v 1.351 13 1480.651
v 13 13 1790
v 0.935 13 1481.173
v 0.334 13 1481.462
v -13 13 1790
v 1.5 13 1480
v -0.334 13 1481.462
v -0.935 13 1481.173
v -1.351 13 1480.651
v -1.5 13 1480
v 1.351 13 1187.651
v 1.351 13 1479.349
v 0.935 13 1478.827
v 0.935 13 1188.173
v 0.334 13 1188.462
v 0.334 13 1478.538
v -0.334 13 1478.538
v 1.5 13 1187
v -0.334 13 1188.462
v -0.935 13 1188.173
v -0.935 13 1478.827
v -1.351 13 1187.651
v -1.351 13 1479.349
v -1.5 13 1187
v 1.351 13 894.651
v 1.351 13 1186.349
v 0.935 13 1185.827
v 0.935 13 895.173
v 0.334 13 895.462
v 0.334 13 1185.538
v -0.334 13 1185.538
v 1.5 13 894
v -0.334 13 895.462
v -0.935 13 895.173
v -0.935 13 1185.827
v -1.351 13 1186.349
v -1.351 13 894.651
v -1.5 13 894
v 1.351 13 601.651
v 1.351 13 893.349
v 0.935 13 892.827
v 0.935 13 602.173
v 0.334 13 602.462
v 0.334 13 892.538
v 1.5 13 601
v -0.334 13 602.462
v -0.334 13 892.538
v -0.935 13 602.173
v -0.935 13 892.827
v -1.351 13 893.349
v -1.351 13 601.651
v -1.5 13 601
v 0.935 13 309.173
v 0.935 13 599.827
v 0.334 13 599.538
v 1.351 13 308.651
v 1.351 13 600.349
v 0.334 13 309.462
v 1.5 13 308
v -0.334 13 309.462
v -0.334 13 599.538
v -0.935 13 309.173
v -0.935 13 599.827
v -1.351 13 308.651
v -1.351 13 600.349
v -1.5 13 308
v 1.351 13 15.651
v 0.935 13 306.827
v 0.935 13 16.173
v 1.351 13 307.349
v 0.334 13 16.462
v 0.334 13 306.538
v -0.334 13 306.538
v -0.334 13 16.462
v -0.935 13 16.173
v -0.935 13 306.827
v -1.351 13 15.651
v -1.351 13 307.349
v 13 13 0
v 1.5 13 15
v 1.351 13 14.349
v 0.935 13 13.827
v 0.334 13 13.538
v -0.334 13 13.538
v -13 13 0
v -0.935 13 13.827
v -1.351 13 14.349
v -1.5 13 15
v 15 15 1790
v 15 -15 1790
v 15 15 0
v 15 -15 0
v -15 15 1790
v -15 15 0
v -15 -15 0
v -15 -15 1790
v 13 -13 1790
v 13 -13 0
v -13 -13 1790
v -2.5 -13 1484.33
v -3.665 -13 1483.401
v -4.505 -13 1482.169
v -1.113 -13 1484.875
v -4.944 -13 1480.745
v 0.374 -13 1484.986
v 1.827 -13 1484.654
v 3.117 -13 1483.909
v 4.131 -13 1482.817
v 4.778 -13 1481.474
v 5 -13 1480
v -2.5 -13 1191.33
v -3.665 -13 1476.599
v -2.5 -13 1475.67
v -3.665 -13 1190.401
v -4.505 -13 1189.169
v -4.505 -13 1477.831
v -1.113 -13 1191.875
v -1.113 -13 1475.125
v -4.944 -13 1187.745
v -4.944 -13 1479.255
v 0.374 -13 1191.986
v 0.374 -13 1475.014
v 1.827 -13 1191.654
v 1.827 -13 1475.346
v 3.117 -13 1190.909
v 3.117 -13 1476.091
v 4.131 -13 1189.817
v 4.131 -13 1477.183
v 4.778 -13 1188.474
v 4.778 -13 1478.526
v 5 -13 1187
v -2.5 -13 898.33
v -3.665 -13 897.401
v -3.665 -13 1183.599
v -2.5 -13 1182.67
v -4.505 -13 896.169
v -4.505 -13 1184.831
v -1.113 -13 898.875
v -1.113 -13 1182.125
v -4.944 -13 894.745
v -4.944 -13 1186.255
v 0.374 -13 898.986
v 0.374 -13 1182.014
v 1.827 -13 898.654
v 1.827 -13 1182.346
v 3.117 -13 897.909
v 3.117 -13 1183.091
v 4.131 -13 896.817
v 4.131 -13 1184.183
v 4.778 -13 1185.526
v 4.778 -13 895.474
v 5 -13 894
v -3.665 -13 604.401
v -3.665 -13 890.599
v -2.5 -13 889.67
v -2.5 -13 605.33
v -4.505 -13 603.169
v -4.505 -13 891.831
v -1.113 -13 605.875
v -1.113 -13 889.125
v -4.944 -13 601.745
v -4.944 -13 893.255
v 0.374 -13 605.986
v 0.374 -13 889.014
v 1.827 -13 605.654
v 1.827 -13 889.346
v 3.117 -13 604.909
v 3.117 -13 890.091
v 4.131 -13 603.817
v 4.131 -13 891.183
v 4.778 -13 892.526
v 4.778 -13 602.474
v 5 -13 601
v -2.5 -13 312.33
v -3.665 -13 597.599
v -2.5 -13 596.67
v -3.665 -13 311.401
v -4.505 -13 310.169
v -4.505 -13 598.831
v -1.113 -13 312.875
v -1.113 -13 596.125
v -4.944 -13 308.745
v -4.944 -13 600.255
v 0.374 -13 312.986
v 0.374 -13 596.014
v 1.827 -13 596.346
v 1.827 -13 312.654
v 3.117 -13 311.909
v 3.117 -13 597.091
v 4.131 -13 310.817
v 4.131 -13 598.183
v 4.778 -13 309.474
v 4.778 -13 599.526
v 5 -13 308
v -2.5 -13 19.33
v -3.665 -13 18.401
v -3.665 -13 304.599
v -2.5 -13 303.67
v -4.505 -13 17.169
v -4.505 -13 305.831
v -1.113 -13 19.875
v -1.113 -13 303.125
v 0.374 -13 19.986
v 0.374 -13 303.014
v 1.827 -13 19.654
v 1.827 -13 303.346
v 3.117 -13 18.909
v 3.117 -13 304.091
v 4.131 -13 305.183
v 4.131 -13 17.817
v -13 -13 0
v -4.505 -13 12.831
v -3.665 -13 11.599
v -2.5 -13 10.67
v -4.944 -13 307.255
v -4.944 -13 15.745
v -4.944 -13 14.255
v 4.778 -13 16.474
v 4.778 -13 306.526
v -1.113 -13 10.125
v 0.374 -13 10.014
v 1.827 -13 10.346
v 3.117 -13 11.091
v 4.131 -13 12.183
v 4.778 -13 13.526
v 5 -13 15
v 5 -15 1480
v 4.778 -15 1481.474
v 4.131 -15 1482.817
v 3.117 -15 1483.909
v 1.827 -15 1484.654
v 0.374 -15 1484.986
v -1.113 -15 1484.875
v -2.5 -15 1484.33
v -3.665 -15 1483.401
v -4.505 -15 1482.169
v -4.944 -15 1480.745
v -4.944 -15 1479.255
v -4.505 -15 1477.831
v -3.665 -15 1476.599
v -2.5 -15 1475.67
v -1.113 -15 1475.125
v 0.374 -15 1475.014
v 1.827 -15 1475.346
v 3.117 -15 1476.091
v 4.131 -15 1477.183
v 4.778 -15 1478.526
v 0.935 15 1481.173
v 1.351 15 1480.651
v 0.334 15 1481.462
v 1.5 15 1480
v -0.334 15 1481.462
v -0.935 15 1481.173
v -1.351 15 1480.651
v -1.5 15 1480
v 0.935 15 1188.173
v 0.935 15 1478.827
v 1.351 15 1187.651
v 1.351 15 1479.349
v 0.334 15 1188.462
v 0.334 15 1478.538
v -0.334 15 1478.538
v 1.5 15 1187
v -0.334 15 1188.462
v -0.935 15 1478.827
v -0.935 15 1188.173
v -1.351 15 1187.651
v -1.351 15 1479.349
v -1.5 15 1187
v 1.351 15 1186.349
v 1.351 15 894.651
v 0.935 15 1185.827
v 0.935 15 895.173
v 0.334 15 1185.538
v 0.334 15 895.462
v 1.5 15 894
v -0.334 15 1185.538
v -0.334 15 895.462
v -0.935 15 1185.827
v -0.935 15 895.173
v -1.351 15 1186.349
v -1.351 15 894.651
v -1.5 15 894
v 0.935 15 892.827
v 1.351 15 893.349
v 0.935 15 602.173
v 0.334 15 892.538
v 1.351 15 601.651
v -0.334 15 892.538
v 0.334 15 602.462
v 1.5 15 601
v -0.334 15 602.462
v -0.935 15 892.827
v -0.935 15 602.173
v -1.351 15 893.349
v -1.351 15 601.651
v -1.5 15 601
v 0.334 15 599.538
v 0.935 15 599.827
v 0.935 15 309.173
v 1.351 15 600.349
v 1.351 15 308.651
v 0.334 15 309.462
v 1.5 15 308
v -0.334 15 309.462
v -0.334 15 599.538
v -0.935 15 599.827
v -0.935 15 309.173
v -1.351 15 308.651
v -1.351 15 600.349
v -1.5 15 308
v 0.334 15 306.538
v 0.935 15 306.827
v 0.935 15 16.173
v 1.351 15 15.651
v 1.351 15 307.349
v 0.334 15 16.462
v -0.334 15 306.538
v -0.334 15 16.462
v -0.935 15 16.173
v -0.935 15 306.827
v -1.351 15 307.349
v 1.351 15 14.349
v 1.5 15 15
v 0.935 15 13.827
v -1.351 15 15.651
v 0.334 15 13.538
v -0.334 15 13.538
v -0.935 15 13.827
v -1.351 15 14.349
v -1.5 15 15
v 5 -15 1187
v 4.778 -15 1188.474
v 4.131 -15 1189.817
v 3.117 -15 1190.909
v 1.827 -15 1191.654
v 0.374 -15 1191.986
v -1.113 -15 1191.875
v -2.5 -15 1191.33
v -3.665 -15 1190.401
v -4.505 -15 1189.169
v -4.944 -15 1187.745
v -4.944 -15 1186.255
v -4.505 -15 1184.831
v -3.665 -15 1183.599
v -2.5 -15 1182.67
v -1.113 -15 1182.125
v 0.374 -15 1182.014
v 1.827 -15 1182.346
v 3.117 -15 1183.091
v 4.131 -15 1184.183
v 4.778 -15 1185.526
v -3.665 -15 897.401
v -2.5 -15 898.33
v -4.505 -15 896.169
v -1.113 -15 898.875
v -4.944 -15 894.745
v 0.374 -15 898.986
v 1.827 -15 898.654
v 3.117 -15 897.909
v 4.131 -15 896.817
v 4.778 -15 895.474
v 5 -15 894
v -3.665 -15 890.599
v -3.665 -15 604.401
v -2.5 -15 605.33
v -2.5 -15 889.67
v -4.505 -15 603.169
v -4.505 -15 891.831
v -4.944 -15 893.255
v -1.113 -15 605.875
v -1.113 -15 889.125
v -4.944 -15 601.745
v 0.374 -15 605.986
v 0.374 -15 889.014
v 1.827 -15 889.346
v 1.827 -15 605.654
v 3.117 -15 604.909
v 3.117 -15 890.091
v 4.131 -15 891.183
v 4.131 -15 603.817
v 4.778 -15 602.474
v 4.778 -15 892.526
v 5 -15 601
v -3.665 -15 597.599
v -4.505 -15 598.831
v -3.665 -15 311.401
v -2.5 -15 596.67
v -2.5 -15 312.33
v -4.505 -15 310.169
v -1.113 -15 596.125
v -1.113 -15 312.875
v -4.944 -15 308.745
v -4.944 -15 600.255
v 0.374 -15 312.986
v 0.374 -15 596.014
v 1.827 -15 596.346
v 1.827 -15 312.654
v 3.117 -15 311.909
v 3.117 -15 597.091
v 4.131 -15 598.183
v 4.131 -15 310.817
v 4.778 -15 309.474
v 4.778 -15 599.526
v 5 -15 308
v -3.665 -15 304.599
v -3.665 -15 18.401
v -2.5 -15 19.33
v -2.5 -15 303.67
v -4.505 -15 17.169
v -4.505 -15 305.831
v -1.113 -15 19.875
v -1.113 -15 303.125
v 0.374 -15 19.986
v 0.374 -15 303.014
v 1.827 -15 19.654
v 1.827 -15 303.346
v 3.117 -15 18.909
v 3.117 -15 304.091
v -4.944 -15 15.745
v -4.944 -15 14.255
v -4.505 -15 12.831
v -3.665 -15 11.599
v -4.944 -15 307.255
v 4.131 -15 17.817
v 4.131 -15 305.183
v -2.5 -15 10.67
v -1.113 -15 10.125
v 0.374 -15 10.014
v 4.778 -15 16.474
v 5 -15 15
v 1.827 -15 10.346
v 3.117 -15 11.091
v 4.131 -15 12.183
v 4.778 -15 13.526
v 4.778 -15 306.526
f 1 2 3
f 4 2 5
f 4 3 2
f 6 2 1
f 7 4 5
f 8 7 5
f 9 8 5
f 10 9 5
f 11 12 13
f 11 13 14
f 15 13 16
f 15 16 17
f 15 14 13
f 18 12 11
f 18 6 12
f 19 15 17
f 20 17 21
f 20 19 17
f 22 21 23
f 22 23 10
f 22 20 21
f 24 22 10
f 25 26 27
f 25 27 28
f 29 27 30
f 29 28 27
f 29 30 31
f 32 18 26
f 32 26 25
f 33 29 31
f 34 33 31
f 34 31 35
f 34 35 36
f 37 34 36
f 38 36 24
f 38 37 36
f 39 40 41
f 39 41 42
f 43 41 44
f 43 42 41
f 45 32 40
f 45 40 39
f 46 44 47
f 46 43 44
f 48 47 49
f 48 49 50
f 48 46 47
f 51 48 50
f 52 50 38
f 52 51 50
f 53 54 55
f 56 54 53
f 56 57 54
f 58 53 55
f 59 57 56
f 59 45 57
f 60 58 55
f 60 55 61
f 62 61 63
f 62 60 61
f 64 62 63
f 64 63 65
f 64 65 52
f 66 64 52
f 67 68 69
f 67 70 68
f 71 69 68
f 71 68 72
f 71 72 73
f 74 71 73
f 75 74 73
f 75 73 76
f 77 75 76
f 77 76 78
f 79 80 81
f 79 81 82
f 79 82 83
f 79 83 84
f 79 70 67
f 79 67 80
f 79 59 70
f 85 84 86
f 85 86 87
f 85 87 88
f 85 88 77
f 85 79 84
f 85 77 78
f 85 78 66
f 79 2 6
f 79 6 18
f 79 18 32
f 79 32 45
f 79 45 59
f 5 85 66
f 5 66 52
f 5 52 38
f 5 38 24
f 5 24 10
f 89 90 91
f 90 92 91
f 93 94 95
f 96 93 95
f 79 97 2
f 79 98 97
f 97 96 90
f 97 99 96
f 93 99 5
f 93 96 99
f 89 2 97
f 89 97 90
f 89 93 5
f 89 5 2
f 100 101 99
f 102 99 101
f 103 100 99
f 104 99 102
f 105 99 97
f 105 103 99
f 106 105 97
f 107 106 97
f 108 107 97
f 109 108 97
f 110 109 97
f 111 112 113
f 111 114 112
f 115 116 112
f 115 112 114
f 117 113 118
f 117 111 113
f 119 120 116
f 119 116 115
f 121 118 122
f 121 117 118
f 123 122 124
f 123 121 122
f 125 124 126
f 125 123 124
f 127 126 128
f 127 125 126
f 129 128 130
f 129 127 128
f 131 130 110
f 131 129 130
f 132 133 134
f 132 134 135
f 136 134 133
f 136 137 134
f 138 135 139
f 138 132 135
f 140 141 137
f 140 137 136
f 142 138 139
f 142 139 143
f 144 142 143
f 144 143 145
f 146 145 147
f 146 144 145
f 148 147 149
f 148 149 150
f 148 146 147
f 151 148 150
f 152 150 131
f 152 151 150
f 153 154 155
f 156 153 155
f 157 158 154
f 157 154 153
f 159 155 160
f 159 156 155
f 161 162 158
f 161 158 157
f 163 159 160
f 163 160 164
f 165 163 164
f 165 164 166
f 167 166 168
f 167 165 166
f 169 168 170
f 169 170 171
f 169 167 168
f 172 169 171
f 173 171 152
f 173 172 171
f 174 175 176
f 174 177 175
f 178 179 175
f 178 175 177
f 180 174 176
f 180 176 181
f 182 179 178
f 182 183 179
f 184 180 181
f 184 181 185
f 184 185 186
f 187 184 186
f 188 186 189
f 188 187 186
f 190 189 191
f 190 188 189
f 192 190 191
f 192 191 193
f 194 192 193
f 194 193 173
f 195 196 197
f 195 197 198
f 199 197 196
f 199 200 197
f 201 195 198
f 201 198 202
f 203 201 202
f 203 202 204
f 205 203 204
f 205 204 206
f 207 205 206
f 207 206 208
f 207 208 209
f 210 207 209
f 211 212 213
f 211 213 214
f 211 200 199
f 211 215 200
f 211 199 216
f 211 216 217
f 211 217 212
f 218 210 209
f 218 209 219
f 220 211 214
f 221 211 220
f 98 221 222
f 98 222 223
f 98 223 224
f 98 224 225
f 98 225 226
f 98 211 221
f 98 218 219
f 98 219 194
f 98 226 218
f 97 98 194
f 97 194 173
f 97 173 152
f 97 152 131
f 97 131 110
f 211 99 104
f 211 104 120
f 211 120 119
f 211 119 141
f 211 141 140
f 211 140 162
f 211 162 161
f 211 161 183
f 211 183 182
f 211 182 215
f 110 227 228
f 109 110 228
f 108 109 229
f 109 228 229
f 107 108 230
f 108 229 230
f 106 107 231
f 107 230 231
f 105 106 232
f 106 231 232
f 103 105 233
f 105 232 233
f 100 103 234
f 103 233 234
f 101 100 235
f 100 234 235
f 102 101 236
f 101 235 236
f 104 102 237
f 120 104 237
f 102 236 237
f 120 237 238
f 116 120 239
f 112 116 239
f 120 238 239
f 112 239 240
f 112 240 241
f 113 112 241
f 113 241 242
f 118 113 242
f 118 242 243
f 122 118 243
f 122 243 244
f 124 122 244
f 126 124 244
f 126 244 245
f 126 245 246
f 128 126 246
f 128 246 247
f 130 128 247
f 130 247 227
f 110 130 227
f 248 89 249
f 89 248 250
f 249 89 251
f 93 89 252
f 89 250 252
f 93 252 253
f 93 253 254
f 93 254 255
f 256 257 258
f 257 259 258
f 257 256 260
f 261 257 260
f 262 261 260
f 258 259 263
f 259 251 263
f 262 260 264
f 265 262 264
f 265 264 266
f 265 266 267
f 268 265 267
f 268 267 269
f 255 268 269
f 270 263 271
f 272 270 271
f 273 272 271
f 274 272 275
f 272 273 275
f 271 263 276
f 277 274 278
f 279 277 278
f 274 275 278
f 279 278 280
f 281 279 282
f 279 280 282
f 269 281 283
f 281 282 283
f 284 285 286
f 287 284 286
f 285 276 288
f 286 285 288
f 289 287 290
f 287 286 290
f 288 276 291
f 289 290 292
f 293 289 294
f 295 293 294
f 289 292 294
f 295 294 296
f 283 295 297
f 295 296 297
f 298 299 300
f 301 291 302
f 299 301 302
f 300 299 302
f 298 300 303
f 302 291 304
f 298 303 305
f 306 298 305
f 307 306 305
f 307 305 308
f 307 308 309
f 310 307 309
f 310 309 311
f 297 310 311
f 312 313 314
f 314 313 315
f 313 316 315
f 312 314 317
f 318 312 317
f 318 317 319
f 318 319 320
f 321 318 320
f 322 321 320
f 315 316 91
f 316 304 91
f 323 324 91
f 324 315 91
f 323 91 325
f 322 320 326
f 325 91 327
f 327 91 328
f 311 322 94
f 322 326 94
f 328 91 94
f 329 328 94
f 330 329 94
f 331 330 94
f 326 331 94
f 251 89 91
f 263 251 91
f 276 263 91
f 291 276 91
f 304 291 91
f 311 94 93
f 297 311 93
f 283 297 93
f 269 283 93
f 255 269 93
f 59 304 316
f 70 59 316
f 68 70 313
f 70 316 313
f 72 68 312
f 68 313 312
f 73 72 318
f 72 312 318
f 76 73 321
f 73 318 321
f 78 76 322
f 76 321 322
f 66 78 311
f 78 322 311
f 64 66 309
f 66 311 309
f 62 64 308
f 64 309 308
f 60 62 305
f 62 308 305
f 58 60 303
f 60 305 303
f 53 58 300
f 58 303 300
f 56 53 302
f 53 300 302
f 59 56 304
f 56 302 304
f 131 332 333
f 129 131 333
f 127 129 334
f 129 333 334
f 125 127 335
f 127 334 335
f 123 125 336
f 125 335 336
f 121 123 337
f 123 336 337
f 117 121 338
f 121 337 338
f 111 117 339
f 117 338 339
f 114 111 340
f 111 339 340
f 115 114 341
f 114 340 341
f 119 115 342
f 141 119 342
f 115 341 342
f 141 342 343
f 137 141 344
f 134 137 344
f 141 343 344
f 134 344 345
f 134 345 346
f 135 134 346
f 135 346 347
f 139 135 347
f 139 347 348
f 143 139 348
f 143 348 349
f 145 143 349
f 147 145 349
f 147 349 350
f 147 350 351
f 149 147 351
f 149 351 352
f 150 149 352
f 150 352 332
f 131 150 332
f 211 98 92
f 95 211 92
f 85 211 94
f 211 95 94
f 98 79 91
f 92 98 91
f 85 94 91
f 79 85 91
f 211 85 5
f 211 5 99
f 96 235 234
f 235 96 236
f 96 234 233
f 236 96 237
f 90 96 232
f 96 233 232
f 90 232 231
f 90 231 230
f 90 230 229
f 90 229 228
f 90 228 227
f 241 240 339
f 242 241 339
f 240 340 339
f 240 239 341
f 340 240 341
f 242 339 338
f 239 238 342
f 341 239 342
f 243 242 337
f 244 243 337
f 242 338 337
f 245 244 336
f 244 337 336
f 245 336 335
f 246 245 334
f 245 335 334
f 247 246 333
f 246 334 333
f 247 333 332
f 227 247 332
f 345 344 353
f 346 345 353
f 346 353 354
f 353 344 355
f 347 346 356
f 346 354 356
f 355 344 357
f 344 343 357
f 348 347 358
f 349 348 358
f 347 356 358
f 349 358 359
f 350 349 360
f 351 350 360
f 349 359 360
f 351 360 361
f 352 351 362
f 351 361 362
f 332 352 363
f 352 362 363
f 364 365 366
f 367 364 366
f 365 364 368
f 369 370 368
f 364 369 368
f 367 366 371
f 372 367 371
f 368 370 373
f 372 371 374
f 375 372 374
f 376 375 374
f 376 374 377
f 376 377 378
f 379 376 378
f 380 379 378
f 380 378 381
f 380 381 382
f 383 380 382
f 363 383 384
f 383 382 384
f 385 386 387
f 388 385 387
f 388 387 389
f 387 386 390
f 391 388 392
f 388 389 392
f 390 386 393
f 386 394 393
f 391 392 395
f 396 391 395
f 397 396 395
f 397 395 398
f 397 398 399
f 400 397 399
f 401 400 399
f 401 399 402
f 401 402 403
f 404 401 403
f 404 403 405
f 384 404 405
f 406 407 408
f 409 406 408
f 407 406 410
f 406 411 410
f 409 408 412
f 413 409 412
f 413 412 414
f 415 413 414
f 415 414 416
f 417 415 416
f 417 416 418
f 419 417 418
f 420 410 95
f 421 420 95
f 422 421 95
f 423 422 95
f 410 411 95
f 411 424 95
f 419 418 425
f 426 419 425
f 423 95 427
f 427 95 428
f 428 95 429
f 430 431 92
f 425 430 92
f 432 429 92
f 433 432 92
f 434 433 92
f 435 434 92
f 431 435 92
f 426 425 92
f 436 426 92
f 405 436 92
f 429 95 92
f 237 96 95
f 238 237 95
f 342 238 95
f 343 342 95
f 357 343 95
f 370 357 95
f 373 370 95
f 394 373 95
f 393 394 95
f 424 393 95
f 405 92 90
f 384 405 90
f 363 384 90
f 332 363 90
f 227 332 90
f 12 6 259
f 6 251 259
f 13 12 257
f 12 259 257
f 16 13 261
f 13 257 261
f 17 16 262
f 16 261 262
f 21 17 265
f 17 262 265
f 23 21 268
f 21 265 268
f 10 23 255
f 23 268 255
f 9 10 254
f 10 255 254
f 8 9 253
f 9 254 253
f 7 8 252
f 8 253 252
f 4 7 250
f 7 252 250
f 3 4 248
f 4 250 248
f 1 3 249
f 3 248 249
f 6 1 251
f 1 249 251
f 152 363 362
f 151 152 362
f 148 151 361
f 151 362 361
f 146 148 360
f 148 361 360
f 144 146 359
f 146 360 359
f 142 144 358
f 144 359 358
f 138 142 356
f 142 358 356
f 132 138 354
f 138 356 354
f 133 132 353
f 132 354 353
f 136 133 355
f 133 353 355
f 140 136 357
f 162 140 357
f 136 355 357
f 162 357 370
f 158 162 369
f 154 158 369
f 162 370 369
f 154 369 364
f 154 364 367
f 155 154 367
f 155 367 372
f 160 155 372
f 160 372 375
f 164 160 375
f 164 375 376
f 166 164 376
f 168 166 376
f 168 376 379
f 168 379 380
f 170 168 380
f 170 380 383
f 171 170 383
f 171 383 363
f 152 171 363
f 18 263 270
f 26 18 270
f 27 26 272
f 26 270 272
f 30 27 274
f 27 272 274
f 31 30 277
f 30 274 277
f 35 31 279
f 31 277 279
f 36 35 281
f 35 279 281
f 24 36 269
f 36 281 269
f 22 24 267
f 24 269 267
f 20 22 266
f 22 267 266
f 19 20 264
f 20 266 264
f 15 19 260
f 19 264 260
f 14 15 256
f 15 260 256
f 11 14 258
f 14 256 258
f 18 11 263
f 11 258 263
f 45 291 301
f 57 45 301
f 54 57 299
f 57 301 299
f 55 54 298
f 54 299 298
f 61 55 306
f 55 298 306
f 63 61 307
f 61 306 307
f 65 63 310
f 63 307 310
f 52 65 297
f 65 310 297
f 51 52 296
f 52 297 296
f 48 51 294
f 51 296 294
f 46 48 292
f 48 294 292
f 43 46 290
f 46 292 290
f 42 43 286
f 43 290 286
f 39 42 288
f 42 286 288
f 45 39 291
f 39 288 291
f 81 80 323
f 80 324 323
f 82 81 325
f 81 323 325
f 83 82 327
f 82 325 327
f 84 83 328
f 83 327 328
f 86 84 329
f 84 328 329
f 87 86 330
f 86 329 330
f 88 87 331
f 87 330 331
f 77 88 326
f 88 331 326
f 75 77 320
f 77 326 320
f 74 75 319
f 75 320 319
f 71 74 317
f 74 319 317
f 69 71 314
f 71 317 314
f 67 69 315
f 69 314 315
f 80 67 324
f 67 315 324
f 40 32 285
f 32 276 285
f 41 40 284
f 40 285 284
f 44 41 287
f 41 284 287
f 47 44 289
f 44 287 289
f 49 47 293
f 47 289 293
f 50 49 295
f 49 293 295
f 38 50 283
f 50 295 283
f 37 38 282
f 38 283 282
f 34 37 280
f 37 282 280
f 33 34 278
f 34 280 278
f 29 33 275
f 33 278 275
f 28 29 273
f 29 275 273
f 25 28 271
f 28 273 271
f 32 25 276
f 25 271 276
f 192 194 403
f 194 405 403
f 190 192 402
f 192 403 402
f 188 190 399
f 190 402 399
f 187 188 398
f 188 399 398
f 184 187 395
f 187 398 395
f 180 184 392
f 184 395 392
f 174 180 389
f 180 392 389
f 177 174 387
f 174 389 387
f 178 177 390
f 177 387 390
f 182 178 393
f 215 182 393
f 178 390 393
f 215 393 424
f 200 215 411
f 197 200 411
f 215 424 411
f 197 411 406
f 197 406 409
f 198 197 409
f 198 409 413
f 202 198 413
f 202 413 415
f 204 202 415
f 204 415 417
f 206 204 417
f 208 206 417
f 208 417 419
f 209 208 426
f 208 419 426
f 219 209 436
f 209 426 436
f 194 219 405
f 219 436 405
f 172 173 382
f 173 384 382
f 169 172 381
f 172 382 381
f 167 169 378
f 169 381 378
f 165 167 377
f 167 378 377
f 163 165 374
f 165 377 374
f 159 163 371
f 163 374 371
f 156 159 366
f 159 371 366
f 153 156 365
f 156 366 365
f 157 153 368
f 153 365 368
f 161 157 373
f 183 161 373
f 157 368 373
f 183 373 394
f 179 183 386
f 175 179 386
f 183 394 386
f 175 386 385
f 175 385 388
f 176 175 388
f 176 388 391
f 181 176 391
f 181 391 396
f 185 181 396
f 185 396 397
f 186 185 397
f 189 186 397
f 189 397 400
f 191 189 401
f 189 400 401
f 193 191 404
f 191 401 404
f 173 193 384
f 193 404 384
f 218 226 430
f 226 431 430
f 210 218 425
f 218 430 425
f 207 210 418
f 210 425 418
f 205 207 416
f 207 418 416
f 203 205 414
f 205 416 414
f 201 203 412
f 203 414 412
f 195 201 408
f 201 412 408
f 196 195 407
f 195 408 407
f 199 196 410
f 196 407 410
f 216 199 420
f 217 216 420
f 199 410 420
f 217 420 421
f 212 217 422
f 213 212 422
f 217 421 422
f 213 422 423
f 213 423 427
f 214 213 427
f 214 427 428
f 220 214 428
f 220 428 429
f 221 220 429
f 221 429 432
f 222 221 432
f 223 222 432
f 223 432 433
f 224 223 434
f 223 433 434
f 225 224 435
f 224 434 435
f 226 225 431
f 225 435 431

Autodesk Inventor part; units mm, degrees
ref_plane "YZ Plane" through (0, 0, 0) normal (1, 0, 0) x (0, 1, 0)
ref_plane "XZ Plane" through (0, 0, 0) normal (0, 1, 0) x (-1, 0, 0)
ref_plane "XY Plane" through (0, 0, 0) normal (0, 0, 1) x (1, 0, 0)
sketch "Náčrt1" plane through (0, 0, 0) normal (0, 0, 1) x (1, 0, 0)
  line L0 (-15, -15) -> (15, -15)
  line L1 (15, -15) -> (15, 15)
  line L2 (15, 15) -> (-15, 15)
  line L3 (-15, 15) -> (-15, -15)
  line L4 (-15, -15) -> (15, 15) construction
  line L5 (15, -15) -> (-15, 15) construction
  line L6 (-13, -13) -> (13, -13)
  line L7 (13, -13) -> (13, 13)
  line L8 (13, 13) -> (-13, 13)
  line L9 (-13, 13) -> (-13, -13)
  line L10 (-13, -13) -> (13, 13) construction
  line L11 (13, -13) -> (-13, 13) construction
  point P0 (0, 0)
  dimension "d0" = 30
  dimension "d1" = 30
  dimension "d2" = 26
  dimension "d3" = 26
extrude "Vysunutí1" add sketch "Náčrt1" along normal blind 1790
sketch "Náčrt2" plane through (-15, 15, 0) normal (0, 1, 0) x (1, 0, 0)
  circle A0 centre (15, -15) radius 1.5
  line L0 (30, 0) -> (0, 0) projected
  line L1 (0, 0) -> (0, -1790) projected
  line L2 (30, -1790) -> (0, -1790) projected
  line L3 (30, 0) -> (30, -1790) projected
  point P0 (15, 0)
  dimension "d8" = 3
  dimension "d13" = 15
  dimension "d19" = 15
extrude "Vysunutí2" cut sketch "Náčrt2" against normal up to surface (2 mm away) contours A0
sketch "Náčrt3" plane through (-15, -15, 0) normal (0, -1, 0) x (1, 0, 0)
  line L0 (30, 0) -> (0, 0) projected
  line L1 (0, 0) -> (0, 1790) projected
  line L2 (30, 1790) -> (0, 1790) projected
  line L3 (30, 0) -> (30, 1790) projected
  circle A0 centre (15, 15) radius 1.5 projected
  circle A1 centre (15, 15) radius 5
  point P0 (15, 0)
  dimension "d15" = 10
extrude "Vysunutí3" cut sketch "Náčrt3" against normal up to surface (2 mm away) contours A0 | A1
pattern_linear "Obdélníkové pole1" count 6 spacing 293 along (0, 0, 1) of "Vysunutí2"
pattern_linear "Obdélníkové pole3" count 6 spacing 293 along (0, 0, 1) of "Vysunutí3"
equation "\"d0\" = width"
equation "\"d1\" = width"
equation "\"d2\" = width - 2 * thickness"
equation "\"d3\" = width - 2 * thickness"
equation "\"d4\" = length"
equation "\"d8\" = holeDia"
equation "\"d13\" = holeOffset"
equation "\"d19\" = 0.5 * width"
equation "\"d15\" = holeDiaOpposite"
equation "\"d22\" = holeDistance"
equation "\"d28\" = holeDistance"
equation "\"width\" = gSquareProfile_Width_Rack"
equation "\"thickness\" = gSquareProfile_Thickness_Rack"
equation "\"length\" = gRack_Rom_Height - 2 * width"
equation "\"holeDistance\" = 293"
equation "\"holeDiaOpposite\" = 10"
equation "\"holeDia\" = 3"
equation "\"holeOffset\" = 0.5 * width"
equation "\"gSquareProfile_Width_Rack\" = 30"
equation "\"gSquareProfile_Thickness_Rack\" = 2"
equation "\"gRack_Rom_Height\" = 1850"
properties part number "Profile-Square#16"
